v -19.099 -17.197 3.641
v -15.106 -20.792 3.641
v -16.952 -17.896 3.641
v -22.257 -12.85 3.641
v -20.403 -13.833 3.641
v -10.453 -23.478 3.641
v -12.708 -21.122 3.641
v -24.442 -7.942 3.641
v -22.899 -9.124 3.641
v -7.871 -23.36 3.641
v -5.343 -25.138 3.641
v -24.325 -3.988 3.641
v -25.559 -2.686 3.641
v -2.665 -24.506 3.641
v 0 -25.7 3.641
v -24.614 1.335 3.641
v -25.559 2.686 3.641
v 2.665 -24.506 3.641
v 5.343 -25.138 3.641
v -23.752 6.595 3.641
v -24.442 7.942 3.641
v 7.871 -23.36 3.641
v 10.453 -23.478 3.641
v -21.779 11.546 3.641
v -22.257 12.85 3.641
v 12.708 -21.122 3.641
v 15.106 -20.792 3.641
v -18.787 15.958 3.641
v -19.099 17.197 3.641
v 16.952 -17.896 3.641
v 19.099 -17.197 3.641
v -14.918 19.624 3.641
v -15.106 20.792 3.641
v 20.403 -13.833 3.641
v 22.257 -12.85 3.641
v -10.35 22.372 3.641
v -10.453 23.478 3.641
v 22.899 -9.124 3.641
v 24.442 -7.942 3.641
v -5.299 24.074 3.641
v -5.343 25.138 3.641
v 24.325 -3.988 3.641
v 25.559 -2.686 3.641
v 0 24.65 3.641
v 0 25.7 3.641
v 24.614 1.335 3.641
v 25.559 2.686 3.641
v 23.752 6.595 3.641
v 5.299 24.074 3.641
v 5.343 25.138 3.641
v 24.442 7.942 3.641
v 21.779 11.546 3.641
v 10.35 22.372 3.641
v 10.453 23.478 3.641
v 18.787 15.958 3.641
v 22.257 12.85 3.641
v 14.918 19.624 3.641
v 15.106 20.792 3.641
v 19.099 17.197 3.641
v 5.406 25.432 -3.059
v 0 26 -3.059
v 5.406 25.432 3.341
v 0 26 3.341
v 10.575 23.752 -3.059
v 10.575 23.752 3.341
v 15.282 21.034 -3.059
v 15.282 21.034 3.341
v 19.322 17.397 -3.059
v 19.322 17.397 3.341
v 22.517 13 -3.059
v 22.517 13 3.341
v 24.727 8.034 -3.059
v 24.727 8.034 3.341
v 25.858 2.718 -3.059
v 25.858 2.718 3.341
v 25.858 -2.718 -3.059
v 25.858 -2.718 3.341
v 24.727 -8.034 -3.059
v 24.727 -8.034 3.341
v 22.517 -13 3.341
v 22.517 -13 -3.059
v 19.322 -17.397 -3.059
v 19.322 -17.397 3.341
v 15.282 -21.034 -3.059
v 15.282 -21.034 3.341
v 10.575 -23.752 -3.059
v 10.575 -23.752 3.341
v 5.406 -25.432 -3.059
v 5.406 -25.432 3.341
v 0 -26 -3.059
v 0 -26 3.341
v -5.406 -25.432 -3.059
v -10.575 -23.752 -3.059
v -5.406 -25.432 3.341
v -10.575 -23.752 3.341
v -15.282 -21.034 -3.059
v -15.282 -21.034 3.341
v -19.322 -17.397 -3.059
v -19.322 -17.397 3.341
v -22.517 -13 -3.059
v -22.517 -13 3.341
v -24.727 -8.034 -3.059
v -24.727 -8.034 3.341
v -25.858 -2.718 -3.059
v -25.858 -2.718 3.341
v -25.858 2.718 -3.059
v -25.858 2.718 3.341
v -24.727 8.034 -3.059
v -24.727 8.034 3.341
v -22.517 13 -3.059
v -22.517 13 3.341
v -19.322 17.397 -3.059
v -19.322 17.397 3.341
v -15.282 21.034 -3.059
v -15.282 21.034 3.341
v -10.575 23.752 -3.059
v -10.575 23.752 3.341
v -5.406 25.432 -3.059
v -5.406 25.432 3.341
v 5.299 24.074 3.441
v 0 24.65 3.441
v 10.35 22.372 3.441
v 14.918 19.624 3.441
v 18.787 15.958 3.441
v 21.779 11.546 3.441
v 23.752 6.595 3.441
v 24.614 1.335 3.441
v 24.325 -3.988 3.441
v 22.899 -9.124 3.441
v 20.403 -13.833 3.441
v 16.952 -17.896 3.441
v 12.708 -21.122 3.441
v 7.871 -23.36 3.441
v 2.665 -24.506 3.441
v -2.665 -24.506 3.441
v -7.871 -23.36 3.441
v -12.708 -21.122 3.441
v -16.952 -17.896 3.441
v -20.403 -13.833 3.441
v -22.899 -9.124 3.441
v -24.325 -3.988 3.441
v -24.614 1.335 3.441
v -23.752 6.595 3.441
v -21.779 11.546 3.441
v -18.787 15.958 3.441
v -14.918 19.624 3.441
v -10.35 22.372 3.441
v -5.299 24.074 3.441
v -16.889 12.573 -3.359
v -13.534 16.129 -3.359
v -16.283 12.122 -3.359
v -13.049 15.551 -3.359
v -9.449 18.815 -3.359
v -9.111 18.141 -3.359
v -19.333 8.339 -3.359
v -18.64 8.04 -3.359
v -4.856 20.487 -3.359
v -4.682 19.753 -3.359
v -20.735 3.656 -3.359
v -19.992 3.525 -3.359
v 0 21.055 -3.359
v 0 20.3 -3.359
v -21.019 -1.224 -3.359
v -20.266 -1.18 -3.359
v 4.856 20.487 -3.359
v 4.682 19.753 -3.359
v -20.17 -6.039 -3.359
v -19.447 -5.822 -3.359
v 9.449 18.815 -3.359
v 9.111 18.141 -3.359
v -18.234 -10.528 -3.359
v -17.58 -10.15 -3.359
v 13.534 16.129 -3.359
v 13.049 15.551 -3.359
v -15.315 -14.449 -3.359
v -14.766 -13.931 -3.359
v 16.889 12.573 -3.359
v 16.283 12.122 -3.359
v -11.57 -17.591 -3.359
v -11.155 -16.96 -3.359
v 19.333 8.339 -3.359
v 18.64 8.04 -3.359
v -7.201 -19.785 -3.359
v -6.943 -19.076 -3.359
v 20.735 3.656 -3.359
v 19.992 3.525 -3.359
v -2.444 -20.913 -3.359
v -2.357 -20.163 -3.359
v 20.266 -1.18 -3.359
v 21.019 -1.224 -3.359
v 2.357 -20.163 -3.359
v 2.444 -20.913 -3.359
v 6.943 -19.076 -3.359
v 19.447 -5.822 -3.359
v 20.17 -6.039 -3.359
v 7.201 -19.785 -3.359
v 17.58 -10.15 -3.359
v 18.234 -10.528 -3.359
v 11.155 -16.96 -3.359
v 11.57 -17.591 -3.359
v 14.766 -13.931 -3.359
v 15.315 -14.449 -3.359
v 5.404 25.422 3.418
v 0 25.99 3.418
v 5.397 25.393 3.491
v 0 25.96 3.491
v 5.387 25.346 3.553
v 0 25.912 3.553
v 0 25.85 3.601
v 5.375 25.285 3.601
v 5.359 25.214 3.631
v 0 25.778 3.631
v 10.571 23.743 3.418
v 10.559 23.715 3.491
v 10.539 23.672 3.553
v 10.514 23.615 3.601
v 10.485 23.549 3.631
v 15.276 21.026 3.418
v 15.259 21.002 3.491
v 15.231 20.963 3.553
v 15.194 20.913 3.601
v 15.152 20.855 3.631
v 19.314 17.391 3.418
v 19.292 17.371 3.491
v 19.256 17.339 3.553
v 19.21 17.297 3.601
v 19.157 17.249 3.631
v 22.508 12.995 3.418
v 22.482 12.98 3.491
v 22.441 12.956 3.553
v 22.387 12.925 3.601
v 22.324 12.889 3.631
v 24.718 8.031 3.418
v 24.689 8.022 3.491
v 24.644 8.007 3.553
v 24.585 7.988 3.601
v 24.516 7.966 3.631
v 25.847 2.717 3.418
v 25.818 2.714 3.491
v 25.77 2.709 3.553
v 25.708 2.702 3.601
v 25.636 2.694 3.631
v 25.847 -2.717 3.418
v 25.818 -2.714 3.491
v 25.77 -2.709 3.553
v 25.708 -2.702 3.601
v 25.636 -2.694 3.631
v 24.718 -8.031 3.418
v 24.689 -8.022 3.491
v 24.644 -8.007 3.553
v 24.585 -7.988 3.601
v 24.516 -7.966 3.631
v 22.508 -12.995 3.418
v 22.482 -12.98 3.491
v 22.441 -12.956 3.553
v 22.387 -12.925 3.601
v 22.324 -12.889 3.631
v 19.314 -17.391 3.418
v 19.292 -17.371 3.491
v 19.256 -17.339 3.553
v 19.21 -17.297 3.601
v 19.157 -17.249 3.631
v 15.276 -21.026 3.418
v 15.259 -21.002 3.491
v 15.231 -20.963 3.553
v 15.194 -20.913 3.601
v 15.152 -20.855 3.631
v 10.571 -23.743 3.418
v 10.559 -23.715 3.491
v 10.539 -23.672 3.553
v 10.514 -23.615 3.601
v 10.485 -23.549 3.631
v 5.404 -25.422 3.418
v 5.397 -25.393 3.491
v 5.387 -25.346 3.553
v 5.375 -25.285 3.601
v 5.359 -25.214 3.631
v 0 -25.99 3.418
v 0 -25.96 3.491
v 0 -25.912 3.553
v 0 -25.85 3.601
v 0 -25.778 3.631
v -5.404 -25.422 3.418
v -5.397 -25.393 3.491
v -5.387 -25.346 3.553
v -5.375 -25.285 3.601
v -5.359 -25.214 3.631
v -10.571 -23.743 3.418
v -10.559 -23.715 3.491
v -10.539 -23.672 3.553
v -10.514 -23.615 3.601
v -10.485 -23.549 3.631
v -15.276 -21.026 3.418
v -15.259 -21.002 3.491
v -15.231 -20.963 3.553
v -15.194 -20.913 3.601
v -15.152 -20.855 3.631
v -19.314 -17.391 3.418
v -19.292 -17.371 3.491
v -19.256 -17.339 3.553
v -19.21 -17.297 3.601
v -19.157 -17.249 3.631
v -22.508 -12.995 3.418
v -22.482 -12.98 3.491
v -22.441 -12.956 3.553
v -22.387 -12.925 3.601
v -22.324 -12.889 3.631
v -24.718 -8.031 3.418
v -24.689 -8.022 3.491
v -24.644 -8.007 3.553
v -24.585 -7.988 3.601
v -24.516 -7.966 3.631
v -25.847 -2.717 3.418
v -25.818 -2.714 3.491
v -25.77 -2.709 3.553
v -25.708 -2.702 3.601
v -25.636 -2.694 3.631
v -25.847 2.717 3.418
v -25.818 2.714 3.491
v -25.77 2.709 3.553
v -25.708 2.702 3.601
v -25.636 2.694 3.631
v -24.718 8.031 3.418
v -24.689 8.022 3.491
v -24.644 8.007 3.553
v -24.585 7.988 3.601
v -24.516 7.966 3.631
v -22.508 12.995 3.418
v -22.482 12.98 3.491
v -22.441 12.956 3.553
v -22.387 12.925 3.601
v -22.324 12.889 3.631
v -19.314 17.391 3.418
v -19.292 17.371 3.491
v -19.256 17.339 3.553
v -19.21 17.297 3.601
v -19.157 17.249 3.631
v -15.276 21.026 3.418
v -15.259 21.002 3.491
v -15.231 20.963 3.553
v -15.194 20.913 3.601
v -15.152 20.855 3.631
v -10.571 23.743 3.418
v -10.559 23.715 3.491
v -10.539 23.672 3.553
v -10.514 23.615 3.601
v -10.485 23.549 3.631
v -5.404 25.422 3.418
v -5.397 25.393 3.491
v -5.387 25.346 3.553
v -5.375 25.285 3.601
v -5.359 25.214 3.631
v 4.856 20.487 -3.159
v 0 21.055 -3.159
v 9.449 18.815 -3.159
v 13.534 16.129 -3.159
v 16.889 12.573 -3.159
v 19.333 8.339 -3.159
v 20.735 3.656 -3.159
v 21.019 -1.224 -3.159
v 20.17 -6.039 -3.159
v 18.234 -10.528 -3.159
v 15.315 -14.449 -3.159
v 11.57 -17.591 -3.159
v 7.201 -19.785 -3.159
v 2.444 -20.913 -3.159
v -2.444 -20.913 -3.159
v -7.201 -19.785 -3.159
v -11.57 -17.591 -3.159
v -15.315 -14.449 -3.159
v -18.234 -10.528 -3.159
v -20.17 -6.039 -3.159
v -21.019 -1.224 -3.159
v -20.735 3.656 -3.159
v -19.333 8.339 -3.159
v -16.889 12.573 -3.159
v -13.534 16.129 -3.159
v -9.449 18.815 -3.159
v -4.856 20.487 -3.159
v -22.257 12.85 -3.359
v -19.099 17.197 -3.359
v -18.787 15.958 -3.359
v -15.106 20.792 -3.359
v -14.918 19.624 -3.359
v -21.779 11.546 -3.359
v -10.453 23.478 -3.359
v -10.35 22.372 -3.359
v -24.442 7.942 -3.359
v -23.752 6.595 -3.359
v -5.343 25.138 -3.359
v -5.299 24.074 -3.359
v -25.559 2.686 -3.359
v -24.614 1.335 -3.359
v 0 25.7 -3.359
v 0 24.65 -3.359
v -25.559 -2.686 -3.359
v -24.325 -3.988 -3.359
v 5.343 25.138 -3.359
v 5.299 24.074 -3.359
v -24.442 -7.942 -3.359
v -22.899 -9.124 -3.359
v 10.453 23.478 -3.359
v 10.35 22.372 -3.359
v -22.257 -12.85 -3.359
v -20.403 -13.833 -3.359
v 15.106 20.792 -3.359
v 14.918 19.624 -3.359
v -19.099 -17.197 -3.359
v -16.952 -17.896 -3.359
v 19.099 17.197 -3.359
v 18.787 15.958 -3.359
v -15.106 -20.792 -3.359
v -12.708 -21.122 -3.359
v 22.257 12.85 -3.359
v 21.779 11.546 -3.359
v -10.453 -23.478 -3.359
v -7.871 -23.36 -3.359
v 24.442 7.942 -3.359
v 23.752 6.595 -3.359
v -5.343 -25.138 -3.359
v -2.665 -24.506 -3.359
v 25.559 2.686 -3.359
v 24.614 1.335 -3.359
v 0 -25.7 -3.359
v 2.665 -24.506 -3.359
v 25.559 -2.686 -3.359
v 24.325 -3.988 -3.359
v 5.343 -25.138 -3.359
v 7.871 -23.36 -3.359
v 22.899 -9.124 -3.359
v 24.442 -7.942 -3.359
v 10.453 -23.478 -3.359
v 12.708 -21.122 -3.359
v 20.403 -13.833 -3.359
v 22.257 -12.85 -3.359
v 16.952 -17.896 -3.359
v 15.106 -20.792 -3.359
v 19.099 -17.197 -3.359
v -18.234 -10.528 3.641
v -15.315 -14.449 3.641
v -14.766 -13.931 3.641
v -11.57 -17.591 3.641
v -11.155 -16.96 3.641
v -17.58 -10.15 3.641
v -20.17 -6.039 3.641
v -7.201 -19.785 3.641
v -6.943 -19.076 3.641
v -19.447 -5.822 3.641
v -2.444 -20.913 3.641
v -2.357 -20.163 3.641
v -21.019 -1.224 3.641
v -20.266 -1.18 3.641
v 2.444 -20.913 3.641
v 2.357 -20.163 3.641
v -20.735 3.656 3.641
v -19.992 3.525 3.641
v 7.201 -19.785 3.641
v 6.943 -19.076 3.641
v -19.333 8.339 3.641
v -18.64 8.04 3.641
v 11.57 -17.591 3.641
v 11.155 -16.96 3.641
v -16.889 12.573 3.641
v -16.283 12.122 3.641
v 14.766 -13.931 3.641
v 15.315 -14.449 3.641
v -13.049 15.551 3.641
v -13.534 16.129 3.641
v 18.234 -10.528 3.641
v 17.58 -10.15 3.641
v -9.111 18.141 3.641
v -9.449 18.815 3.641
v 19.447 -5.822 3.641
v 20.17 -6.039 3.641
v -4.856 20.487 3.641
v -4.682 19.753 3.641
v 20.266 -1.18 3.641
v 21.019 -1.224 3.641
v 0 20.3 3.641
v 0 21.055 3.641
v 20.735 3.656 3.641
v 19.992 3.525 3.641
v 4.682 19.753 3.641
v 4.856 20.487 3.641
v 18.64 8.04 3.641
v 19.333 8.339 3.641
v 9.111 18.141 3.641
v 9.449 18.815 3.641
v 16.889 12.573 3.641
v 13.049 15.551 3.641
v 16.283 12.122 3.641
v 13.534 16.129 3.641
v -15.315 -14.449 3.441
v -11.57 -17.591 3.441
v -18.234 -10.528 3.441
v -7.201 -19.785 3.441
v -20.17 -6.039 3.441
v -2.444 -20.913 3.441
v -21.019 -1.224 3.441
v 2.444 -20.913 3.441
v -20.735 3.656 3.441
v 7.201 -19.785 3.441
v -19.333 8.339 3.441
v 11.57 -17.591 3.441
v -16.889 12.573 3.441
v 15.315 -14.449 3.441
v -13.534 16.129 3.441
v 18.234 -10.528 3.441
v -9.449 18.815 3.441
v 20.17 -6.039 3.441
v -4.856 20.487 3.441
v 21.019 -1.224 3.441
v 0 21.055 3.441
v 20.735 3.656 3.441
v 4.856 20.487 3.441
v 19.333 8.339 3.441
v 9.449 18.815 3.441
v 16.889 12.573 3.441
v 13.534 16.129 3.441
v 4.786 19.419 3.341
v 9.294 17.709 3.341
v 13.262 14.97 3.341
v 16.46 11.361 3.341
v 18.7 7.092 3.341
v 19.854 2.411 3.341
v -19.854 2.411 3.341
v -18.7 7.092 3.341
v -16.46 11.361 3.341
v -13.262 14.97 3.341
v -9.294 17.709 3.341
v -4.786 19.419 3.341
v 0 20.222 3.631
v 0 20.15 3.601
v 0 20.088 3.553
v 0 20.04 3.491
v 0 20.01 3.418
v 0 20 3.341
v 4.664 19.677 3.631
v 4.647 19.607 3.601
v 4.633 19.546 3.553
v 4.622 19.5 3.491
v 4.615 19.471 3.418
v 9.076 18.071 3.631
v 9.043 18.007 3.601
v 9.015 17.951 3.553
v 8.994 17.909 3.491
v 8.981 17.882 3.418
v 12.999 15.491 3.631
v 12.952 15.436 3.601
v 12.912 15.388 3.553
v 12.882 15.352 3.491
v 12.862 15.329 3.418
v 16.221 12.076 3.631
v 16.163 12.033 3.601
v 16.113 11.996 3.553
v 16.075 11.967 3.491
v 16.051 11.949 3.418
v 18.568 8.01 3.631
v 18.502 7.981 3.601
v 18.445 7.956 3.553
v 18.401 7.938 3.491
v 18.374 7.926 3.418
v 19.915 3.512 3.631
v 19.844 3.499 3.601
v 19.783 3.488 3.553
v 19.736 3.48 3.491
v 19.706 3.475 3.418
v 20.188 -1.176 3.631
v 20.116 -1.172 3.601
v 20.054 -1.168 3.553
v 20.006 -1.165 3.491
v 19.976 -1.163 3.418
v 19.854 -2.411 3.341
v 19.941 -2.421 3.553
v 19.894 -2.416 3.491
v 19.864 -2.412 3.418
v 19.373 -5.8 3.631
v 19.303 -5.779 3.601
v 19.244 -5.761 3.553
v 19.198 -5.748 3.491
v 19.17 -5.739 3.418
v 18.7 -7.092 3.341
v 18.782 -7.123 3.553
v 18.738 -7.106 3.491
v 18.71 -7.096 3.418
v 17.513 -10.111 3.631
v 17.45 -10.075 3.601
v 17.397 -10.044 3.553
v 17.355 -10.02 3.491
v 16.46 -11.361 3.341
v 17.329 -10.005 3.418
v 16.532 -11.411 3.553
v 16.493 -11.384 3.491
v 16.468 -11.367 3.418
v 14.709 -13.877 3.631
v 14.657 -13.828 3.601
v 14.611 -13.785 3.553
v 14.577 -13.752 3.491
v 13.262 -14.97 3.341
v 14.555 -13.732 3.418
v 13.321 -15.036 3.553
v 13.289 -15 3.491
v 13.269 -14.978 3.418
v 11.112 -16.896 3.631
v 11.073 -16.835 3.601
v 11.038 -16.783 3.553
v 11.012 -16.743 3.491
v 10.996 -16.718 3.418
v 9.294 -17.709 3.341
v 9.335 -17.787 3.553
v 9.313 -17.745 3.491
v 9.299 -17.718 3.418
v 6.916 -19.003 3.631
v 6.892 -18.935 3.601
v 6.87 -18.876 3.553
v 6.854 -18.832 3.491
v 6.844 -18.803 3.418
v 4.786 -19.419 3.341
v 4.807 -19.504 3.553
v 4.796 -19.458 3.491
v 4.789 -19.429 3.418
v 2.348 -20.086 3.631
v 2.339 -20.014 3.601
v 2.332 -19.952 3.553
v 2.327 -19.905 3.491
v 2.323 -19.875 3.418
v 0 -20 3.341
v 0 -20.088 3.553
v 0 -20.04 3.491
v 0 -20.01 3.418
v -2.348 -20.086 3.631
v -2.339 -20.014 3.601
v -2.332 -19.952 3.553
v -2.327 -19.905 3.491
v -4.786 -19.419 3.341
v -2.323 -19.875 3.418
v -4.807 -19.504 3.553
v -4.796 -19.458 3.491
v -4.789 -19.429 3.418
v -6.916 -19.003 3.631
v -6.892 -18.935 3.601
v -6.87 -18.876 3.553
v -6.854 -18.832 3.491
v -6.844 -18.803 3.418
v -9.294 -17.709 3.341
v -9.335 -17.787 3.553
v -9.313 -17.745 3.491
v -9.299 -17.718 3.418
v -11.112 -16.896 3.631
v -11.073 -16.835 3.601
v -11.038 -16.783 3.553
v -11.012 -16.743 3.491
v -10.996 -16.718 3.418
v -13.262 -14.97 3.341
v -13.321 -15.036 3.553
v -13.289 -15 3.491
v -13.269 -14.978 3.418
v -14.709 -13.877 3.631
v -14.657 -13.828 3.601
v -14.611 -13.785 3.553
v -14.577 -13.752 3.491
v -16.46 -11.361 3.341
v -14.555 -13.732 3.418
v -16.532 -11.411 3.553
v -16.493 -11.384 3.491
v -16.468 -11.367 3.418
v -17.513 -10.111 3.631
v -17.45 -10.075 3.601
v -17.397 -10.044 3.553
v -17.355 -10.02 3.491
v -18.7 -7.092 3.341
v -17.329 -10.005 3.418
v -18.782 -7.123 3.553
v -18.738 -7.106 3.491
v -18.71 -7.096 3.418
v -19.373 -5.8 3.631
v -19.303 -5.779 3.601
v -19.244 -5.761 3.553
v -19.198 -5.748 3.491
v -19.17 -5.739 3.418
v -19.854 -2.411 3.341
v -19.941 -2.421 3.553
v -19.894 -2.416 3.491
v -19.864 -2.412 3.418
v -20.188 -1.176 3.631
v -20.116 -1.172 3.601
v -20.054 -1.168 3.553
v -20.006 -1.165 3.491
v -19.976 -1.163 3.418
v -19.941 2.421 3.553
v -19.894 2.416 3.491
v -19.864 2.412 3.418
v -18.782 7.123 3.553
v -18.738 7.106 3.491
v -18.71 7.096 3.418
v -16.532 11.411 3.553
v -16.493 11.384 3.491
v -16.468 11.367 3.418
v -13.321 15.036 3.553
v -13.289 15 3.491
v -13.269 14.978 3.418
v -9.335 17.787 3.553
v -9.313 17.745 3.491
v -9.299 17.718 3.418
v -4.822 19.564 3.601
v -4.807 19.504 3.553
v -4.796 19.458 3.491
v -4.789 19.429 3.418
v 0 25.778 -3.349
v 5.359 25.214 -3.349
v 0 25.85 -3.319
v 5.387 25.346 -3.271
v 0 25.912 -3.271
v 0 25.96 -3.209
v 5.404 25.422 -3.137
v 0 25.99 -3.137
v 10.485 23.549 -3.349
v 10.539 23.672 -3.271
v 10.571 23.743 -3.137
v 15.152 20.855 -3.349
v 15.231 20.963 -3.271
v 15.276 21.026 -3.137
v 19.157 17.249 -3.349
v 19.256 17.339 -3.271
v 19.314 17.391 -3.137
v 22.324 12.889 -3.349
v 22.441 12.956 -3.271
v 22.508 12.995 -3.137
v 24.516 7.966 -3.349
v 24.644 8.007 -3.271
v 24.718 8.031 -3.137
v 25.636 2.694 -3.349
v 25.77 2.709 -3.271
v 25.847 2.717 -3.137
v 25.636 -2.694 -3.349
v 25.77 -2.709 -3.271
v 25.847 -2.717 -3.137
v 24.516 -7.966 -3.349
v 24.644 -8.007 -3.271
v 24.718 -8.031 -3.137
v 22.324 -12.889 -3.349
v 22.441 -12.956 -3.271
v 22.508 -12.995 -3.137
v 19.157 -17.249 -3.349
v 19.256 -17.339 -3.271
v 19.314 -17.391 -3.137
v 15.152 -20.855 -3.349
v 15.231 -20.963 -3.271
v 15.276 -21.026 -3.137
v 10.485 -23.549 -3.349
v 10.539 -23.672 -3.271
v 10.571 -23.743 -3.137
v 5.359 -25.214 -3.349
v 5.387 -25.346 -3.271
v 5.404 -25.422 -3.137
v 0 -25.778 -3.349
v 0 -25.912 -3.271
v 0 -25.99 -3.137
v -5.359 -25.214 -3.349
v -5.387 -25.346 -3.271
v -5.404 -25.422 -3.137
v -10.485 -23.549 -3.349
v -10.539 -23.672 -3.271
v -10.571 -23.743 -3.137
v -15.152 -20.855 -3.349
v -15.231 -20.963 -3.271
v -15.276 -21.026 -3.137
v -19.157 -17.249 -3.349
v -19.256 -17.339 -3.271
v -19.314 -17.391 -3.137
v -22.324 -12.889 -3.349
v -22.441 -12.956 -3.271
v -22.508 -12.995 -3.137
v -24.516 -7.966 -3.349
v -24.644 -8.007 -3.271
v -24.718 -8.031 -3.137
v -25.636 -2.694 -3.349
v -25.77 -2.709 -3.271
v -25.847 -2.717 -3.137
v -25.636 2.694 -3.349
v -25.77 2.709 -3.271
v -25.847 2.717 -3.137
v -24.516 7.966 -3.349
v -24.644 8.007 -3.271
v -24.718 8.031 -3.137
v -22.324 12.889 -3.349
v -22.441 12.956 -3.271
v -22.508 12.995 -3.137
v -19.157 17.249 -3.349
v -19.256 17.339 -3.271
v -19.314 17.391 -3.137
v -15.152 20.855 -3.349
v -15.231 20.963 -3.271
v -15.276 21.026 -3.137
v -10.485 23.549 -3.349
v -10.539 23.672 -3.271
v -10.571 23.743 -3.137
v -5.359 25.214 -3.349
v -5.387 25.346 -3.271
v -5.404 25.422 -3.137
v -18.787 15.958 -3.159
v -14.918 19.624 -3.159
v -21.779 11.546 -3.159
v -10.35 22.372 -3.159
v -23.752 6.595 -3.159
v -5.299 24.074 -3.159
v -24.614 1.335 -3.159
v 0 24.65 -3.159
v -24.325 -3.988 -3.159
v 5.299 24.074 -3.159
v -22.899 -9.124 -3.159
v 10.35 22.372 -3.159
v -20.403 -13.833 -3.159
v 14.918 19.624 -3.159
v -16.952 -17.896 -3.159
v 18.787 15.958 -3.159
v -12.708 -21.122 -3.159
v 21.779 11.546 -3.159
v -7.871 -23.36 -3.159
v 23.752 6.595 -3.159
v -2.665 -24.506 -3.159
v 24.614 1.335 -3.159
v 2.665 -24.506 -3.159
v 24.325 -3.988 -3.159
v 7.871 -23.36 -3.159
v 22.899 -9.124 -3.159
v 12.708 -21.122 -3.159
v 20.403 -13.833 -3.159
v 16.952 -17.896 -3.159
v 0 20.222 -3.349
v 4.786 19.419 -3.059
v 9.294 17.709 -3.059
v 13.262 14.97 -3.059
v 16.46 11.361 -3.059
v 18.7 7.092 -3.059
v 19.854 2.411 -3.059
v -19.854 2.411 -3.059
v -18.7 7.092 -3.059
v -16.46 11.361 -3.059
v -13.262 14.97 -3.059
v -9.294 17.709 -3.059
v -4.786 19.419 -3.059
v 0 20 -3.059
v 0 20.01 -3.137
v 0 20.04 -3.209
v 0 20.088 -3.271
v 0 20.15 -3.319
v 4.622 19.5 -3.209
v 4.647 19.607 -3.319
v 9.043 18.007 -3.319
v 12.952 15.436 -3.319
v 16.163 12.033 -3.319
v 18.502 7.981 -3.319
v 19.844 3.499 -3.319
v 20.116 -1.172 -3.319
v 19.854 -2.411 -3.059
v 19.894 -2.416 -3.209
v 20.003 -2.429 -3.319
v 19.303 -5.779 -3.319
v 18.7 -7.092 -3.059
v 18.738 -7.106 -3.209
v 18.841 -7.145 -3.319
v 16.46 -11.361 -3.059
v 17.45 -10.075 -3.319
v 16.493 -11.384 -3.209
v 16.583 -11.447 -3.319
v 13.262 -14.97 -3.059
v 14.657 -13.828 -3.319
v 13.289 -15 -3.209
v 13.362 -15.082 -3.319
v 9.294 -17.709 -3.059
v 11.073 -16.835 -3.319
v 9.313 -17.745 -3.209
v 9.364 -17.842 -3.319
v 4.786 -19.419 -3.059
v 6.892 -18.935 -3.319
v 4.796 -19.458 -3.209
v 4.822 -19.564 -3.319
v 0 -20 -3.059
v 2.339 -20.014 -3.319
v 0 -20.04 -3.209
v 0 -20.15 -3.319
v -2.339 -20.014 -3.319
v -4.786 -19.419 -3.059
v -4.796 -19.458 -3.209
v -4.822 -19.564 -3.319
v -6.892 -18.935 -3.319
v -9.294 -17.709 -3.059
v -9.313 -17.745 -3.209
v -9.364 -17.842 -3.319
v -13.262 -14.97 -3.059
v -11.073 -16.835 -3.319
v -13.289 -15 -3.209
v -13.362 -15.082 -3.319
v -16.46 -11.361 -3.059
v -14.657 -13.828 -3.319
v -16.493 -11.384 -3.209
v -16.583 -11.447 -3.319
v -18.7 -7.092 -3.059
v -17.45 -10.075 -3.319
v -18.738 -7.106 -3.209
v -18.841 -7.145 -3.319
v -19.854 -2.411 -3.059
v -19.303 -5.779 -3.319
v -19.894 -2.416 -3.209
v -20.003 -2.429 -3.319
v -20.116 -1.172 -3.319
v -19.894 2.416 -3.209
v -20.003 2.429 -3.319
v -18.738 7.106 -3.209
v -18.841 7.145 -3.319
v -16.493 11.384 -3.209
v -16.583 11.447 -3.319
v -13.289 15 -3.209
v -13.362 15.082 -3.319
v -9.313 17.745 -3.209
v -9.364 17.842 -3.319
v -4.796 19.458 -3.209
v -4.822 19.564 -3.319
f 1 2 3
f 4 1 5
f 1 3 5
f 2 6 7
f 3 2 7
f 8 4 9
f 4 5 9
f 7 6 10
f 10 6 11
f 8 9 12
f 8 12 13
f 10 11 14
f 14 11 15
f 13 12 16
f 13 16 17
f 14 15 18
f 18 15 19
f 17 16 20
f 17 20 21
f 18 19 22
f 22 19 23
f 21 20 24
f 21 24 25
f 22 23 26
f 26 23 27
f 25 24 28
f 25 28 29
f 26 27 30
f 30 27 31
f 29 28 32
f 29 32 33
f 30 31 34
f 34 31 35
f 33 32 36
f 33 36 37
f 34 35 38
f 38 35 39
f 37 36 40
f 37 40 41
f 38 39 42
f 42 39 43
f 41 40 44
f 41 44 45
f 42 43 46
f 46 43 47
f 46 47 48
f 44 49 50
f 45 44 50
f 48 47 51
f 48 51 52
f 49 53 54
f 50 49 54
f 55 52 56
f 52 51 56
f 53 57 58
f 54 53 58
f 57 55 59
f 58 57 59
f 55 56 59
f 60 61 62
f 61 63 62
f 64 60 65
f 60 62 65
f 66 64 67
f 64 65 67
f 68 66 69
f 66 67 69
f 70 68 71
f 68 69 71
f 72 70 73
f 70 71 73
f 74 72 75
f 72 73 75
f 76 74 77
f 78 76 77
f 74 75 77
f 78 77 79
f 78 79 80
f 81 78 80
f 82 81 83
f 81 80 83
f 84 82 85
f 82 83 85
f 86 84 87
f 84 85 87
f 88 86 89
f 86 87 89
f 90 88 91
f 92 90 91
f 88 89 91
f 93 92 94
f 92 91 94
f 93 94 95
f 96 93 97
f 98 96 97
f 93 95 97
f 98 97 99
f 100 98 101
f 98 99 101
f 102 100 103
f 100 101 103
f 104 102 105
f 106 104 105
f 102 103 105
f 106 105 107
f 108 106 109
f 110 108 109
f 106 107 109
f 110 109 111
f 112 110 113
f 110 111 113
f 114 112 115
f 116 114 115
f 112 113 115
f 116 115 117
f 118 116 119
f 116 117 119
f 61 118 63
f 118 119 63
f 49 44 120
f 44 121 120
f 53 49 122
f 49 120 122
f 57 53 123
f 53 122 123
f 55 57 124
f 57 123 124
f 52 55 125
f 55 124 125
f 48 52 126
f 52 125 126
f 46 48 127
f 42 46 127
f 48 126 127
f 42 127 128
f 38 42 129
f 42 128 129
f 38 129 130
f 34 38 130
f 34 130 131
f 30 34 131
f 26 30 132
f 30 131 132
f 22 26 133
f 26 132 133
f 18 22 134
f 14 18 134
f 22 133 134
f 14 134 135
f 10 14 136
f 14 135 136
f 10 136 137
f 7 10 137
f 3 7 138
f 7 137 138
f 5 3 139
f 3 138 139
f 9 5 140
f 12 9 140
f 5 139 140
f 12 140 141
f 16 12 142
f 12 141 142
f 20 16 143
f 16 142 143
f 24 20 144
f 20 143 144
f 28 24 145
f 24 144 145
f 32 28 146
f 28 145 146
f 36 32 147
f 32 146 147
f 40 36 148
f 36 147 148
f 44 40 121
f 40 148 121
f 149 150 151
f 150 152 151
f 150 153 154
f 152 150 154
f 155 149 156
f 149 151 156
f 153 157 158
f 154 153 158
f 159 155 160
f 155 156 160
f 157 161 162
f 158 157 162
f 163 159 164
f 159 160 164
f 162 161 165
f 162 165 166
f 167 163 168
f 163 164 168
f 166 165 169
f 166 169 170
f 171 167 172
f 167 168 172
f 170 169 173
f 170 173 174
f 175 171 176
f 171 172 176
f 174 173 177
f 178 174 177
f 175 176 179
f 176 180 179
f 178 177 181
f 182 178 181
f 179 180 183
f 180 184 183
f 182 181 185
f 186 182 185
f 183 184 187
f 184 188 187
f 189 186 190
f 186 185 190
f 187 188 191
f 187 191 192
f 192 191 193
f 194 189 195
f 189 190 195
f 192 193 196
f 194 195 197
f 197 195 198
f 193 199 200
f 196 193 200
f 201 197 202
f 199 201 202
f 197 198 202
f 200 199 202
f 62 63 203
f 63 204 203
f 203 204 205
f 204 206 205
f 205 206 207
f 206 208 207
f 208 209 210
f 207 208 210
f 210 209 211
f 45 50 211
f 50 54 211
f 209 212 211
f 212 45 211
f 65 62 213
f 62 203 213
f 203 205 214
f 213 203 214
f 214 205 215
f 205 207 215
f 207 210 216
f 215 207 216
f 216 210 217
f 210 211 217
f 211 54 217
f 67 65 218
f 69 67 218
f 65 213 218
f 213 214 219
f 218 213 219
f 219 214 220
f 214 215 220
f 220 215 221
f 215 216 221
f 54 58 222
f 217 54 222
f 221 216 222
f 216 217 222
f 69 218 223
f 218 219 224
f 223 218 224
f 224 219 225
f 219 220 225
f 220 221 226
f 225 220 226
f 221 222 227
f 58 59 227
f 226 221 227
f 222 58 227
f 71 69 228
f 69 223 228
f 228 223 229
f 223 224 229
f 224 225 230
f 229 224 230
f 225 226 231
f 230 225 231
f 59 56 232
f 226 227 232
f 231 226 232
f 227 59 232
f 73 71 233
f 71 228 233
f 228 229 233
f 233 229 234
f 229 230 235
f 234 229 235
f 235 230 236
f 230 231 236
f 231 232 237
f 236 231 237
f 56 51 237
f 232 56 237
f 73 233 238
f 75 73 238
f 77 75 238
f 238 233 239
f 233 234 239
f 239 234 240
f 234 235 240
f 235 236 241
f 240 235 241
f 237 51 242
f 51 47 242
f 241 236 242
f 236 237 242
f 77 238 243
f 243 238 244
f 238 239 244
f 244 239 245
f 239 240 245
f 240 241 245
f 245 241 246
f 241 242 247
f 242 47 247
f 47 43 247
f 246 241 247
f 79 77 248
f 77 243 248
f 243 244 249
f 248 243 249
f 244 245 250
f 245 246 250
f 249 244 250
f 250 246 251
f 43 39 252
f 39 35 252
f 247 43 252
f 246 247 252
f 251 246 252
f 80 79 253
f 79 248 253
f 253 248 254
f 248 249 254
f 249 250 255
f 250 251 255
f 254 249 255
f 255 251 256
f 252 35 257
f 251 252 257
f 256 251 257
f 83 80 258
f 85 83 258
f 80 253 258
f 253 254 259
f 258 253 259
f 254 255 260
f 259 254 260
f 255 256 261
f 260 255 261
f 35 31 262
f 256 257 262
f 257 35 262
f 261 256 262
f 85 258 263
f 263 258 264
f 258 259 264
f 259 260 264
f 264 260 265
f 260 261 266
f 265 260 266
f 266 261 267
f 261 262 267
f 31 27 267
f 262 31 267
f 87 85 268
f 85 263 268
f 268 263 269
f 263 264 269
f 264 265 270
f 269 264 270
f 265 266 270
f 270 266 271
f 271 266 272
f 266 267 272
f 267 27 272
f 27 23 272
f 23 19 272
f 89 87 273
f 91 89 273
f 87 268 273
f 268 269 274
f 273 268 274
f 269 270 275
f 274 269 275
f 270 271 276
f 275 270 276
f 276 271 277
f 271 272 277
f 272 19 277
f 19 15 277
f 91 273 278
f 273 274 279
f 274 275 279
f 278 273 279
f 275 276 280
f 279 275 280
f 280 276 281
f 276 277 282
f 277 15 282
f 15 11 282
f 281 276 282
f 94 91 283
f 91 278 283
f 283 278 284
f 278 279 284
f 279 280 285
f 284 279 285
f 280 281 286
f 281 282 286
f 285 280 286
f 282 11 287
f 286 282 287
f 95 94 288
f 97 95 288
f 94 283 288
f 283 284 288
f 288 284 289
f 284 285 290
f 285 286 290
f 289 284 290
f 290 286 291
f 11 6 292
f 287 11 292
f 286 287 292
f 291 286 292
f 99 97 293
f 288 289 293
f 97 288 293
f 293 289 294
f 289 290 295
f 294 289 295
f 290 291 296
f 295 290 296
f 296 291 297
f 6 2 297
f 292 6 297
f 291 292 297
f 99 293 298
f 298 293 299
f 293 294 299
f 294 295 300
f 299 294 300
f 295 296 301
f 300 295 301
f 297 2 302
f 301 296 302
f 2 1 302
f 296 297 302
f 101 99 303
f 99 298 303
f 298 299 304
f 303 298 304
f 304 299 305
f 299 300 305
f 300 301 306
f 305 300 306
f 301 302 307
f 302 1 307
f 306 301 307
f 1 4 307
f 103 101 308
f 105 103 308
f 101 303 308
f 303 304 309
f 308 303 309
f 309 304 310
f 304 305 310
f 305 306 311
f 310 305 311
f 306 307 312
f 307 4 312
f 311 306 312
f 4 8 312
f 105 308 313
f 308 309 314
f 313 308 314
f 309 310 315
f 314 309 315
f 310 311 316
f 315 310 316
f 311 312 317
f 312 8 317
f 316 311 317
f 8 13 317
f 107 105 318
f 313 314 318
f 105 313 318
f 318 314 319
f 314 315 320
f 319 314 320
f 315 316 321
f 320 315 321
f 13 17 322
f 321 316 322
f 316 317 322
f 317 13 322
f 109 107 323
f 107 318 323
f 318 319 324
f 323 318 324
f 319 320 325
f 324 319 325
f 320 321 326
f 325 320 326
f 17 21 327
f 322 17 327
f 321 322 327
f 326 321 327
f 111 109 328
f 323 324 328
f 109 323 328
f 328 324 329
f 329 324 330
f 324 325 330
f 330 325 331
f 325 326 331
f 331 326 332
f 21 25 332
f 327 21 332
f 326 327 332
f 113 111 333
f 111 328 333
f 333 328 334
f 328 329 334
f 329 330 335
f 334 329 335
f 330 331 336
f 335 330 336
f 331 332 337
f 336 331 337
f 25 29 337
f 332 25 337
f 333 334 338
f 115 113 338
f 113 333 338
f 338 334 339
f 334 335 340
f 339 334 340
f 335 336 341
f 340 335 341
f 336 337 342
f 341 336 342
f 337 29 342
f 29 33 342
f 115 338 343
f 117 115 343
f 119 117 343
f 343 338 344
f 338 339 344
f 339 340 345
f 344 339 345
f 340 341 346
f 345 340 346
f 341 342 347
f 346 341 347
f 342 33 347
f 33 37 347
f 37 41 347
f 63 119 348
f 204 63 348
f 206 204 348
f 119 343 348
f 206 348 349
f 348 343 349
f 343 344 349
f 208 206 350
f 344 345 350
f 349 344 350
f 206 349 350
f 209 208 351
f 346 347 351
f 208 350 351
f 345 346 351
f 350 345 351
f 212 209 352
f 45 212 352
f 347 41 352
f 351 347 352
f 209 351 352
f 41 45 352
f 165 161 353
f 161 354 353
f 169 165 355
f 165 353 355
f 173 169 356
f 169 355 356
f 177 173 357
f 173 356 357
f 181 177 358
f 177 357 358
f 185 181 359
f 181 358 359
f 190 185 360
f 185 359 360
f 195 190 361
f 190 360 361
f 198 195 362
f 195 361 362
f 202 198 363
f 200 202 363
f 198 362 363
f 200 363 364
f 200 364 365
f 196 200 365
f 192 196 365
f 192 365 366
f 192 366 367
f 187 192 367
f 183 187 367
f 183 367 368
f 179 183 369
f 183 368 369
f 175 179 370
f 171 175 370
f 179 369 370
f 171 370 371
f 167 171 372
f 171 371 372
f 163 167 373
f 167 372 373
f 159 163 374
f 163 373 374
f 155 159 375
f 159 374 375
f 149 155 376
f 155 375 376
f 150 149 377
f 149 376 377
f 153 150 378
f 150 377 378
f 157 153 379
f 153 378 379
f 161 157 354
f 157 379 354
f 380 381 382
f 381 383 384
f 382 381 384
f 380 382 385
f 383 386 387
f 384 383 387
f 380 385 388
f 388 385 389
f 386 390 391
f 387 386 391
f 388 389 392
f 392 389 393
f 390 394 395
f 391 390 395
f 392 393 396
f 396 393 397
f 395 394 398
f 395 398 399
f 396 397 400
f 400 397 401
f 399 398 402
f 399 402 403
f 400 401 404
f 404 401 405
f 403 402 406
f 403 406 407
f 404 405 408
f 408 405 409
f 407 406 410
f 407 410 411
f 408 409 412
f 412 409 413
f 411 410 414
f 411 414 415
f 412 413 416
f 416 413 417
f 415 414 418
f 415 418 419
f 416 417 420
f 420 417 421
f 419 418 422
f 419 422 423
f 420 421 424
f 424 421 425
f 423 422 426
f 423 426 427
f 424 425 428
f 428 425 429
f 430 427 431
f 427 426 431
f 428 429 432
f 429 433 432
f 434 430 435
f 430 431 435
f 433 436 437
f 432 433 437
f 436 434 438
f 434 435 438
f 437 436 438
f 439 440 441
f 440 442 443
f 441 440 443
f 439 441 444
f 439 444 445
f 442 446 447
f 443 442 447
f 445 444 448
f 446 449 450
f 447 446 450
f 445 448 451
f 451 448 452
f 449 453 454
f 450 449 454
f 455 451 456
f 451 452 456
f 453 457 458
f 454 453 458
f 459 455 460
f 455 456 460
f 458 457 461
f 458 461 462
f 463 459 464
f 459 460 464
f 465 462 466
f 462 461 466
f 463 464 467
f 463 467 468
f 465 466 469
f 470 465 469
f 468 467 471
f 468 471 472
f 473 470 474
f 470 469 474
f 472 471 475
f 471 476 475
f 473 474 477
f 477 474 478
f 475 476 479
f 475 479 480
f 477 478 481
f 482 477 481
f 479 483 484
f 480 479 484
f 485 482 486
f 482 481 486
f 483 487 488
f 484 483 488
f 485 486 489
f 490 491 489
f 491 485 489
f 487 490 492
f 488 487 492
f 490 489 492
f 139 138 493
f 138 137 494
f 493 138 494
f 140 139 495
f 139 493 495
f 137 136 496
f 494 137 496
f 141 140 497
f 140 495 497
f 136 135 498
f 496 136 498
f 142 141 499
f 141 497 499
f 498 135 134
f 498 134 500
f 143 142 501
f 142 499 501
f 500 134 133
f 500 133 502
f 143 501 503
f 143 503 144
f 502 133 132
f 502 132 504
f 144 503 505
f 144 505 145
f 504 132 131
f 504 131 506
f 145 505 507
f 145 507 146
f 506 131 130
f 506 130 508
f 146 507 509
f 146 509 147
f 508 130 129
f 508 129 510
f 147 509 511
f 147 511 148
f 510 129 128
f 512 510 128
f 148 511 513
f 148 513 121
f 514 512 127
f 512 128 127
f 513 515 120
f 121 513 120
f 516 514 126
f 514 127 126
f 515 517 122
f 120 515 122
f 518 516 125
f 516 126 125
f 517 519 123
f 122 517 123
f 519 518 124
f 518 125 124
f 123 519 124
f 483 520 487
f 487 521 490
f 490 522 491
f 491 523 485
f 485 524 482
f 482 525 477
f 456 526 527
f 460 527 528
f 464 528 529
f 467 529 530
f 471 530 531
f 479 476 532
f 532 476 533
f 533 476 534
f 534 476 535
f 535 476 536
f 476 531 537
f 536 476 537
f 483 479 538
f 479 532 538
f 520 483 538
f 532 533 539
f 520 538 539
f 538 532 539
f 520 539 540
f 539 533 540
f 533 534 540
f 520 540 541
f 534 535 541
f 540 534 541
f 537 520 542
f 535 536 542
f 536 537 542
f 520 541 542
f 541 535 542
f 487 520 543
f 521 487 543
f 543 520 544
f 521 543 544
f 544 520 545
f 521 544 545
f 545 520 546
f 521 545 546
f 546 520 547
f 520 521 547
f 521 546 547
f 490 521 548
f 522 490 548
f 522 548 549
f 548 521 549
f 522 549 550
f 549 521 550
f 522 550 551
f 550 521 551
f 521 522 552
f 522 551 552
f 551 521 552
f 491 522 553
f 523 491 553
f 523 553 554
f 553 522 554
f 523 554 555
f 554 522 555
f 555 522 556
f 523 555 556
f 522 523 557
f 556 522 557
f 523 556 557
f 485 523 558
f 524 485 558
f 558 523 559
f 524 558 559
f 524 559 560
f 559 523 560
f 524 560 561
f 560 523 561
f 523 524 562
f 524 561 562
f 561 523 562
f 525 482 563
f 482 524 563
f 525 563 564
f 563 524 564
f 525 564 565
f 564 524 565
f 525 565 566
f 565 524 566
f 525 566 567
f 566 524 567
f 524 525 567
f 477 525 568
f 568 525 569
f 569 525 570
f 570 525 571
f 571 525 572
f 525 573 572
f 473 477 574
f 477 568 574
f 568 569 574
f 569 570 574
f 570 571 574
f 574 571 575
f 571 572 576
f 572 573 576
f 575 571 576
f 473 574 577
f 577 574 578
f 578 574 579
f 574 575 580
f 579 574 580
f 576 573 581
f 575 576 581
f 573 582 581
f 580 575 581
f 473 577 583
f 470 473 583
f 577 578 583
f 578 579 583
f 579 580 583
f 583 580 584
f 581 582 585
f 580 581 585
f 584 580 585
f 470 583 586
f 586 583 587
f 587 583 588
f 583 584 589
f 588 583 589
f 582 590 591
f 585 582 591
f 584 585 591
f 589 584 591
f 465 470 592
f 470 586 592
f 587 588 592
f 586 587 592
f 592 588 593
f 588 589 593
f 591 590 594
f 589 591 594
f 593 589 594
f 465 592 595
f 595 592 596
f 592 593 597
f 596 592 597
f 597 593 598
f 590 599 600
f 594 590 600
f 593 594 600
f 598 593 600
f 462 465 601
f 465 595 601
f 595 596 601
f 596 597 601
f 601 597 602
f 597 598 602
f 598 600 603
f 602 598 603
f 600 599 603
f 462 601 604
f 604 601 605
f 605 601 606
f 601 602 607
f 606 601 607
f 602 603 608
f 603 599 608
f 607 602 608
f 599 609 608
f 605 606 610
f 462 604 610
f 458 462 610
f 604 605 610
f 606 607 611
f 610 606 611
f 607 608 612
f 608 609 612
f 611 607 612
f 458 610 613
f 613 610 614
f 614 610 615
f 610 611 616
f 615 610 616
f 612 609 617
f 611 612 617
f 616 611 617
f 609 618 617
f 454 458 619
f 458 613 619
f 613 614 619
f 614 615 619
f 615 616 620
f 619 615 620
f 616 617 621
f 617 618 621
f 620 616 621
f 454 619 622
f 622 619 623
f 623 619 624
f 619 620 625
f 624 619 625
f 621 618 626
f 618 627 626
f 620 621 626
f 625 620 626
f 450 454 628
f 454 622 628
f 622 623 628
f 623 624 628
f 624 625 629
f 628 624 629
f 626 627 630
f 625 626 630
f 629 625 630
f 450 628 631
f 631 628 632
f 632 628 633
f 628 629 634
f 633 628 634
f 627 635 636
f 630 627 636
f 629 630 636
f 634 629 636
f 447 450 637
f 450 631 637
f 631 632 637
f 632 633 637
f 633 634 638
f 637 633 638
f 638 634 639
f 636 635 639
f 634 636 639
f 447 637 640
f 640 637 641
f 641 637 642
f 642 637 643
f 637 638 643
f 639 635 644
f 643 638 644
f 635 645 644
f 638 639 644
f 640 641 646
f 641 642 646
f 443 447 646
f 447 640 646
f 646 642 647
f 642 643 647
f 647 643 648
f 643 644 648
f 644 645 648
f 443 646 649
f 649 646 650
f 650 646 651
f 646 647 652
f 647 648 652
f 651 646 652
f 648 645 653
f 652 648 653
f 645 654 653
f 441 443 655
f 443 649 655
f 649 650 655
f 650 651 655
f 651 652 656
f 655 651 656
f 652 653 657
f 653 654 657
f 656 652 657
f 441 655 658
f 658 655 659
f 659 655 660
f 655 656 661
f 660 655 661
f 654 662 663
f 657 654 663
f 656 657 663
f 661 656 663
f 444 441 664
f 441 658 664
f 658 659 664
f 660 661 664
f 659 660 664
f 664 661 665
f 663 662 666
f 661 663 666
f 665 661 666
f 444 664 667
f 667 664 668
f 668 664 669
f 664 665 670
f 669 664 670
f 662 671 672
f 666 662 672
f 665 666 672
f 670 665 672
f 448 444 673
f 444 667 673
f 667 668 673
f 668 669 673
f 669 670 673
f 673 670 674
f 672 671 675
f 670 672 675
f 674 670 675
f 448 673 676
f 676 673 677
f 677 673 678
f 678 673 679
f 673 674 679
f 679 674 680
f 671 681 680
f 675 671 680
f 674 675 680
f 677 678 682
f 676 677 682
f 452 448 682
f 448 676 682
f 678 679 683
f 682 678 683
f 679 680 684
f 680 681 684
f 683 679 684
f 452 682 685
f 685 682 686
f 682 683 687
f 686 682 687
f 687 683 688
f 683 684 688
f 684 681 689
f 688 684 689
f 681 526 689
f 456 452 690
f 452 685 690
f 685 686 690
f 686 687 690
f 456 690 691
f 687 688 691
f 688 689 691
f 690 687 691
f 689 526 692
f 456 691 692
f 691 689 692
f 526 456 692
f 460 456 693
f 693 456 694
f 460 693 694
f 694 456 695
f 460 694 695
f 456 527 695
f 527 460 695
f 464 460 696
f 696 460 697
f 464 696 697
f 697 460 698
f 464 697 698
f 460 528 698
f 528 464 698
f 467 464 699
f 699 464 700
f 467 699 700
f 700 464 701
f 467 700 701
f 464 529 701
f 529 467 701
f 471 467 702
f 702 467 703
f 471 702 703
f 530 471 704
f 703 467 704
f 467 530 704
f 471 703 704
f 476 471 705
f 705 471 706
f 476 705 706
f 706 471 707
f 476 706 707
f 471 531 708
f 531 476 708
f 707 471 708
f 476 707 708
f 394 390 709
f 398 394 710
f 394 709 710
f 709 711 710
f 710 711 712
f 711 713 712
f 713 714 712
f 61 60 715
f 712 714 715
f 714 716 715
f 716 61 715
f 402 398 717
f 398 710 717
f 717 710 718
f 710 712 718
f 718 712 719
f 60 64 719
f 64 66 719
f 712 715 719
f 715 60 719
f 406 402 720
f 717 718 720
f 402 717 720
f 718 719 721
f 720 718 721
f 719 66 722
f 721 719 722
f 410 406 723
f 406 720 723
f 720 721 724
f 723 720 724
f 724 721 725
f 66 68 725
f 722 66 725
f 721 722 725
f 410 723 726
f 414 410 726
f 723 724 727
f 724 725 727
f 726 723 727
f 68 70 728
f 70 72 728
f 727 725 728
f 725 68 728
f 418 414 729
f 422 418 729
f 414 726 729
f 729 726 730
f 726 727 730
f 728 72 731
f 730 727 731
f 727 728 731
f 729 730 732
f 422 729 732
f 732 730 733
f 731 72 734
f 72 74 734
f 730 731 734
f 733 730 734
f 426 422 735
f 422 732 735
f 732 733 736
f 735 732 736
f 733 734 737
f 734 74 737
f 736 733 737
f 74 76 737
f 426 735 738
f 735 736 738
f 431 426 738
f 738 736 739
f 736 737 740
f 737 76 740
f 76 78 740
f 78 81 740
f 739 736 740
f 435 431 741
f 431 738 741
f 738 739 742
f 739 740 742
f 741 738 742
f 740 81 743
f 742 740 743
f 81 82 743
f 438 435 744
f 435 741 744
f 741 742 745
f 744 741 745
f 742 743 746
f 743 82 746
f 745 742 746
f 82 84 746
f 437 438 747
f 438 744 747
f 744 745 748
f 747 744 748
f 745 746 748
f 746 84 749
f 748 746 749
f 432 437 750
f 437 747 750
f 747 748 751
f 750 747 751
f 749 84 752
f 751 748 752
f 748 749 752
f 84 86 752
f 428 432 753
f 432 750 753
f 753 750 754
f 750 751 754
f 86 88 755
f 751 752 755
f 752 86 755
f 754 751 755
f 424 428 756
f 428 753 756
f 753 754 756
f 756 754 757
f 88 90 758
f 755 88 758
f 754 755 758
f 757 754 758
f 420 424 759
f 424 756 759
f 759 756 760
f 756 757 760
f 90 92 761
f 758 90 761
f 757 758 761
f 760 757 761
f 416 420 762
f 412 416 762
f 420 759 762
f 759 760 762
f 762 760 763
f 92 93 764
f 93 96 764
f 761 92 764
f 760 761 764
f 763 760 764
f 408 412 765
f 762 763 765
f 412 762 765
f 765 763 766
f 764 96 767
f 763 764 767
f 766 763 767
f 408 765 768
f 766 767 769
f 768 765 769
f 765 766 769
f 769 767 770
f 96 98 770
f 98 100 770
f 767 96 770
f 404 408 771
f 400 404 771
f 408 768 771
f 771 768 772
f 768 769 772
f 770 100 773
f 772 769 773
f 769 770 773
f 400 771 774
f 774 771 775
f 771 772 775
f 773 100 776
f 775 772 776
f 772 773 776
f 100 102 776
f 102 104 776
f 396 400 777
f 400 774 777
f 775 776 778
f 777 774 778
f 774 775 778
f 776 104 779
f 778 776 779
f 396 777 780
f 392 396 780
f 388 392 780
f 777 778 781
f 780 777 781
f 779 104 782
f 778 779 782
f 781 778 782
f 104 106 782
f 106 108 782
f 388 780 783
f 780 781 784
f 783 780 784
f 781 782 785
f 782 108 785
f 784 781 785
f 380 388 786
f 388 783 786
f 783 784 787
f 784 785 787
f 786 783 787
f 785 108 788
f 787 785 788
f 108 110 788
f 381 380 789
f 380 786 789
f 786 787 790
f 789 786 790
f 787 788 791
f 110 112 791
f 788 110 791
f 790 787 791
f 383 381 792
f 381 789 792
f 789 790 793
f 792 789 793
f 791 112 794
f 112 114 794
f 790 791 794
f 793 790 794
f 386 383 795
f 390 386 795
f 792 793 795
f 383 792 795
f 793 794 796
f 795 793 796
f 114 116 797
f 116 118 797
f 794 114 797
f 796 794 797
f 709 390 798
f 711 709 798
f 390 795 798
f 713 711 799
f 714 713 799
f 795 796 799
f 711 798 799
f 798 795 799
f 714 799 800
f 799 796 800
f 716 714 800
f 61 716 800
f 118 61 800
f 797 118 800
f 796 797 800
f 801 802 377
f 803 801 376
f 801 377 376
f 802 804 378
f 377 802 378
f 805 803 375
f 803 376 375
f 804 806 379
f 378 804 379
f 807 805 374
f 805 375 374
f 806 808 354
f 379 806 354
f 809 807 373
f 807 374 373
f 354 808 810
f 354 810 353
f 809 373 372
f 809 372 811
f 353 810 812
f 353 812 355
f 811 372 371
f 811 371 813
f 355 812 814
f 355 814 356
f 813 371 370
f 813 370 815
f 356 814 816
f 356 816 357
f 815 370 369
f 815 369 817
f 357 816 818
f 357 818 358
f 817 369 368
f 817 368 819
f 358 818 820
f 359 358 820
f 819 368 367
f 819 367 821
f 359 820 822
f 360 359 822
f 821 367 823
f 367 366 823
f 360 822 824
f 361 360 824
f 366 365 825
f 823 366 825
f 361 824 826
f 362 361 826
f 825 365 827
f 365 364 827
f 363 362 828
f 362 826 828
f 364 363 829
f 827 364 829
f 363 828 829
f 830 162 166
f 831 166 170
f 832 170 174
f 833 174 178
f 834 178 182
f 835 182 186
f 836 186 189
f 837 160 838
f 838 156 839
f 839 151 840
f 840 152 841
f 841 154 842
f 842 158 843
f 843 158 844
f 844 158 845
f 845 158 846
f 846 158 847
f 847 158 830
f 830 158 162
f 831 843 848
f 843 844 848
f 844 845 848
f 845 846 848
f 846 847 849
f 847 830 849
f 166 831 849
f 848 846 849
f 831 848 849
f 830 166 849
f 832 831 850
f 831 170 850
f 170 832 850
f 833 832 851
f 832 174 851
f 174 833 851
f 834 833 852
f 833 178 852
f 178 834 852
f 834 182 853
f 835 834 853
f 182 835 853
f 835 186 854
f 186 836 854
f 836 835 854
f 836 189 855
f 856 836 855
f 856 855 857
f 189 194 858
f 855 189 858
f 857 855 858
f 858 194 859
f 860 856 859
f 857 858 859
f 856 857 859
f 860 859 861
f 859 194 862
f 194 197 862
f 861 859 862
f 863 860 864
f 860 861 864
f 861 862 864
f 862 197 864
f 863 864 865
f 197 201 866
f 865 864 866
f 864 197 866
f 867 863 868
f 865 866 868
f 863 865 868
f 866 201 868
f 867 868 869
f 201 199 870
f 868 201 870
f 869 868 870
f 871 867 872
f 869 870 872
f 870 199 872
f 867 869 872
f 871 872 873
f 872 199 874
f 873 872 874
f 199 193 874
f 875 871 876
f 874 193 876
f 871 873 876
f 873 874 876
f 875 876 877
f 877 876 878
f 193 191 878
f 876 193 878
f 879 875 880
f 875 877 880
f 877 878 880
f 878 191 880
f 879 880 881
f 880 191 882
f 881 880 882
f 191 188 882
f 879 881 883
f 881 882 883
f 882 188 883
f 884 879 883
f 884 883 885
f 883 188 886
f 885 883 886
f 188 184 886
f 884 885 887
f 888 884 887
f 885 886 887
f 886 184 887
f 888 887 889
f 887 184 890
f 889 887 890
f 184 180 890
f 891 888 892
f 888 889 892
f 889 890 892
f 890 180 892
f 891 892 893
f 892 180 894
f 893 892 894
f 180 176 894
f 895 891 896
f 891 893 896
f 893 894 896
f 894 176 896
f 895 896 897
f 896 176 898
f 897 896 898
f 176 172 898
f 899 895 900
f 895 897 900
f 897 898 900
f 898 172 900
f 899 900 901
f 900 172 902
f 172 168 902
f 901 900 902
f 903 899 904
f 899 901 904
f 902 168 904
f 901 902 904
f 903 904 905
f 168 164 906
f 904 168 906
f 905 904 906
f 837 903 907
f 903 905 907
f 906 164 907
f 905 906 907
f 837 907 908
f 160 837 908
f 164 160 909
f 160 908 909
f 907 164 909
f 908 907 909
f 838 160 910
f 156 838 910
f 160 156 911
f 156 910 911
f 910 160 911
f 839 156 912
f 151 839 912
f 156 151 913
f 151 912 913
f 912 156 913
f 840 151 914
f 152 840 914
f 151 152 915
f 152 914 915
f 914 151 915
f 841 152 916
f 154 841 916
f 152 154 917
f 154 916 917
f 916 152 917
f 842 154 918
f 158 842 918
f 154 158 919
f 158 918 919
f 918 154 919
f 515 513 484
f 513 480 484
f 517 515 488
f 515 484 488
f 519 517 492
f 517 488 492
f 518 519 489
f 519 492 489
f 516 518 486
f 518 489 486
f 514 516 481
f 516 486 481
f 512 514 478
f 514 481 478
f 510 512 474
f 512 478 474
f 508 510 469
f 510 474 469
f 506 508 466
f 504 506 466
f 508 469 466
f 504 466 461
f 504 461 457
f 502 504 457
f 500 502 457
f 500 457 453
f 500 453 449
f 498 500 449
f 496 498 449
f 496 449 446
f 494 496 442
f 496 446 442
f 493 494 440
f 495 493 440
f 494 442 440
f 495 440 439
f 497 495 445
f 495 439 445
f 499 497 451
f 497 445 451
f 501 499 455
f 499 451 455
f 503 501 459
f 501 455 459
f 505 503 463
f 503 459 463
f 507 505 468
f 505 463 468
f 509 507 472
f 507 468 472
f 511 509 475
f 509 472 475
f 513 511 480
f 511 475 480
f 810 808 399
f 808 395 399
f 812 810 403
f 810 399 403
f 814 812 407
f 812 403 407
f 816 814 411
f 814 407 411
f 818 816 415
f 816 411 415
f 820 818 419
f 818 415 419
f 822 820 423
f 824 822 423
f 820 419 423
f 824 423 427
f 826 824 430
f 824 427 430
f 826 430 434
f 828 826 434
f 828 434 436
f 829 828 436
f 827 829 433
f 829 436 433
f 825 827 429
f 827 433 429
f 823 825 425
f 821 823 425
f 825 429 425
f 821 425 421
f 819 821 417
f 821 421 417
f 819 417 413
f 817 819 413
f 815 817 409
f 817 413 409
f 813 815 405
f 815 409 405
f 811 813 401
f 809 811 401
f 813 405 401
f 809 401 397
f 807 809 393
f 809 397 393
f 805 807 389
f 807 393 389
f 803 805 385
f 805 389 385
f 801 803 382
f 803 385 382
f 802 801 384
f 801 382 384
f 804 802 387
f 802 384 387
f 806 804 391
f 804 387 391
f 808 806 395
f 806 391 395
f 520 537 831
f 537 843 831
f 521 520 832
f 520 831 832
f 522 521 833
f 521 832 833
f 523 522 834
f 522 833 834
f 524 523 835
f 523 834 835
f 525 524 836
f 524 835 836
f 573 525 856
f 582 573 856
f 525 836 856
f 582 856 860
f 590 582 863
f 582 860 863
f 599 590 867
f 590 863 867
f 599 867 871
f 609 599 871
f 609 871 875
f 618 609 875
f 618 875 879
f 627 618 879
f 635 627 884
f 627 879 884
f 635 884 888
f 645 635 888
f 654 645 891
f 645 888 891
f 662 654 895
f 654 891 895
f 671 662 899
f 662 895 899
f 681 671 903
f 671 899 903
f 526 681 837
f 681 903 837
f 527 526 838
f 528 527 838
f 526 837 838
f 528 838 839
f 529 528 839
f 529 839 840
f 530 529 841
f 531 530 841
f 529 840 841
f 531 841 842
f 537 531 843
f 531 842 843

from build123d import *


with BuildPart() as part:
    # Sketch1 → Revolve1 (revolve)
    with BuildSketch(Plane(origin=(0, 0, 0), x_dir=(0, 0, -1), z_dir=(1, 0, 0))):
        with BuildLine():
            ThreePointArc((-3.640744937, 20.3), (-3.552876972, 20.087867966), (-3.340744937, 20))
            Line((-3.340744937, 20), (3.059255063, 20))
            ThreePointArc((3.059255063, 20), (3.271387097, 20.087867966), (3.359255063, 20.3))
            Line((3.359255063, 20.3), (3.359255063, 21.055000054))
            Line((3.359255063, 21.055000054), (3.159255063, 21.055000054))
            Line((3.159255063, 21.055000054), (3.159255063, 24.650000054))
            Line((3.159255063, 24.650000054), (3.359255063, 24.650000054))
            Line((3.359255063, 24.650000054), (3.359255063, 25.7))
            ThreePointArc((3.359255063, 25.7), (3.271387097, 25.912132034), (3.059255063, 26))
            Line((3.059255063, 26), (-3.340744937, 26))
            ThreePointArc((-3.340744937, 26), (-3.552876972, 25.912132034), (-3.640744937, 25.7))
            Line((-3.640744937, 25.7), (-3.640744937, 24.650000054))
            Line((-3.640744937, 24.650000054), (-3.440744937, 24.650000054))
            Line((-3.440744937, 24.650000054), (-3.440744937, 21.055000054))
            Line((-3.440744937, 21.055000054), (-3.640744937, 21.055000054))
            Line((-3.640744937, 21.055000054), (-3.640744937, 20.3))
        make_face()
    revolve(axis=Axis((0, 0, 0), (0, 0, -1)))


solid = part.part
